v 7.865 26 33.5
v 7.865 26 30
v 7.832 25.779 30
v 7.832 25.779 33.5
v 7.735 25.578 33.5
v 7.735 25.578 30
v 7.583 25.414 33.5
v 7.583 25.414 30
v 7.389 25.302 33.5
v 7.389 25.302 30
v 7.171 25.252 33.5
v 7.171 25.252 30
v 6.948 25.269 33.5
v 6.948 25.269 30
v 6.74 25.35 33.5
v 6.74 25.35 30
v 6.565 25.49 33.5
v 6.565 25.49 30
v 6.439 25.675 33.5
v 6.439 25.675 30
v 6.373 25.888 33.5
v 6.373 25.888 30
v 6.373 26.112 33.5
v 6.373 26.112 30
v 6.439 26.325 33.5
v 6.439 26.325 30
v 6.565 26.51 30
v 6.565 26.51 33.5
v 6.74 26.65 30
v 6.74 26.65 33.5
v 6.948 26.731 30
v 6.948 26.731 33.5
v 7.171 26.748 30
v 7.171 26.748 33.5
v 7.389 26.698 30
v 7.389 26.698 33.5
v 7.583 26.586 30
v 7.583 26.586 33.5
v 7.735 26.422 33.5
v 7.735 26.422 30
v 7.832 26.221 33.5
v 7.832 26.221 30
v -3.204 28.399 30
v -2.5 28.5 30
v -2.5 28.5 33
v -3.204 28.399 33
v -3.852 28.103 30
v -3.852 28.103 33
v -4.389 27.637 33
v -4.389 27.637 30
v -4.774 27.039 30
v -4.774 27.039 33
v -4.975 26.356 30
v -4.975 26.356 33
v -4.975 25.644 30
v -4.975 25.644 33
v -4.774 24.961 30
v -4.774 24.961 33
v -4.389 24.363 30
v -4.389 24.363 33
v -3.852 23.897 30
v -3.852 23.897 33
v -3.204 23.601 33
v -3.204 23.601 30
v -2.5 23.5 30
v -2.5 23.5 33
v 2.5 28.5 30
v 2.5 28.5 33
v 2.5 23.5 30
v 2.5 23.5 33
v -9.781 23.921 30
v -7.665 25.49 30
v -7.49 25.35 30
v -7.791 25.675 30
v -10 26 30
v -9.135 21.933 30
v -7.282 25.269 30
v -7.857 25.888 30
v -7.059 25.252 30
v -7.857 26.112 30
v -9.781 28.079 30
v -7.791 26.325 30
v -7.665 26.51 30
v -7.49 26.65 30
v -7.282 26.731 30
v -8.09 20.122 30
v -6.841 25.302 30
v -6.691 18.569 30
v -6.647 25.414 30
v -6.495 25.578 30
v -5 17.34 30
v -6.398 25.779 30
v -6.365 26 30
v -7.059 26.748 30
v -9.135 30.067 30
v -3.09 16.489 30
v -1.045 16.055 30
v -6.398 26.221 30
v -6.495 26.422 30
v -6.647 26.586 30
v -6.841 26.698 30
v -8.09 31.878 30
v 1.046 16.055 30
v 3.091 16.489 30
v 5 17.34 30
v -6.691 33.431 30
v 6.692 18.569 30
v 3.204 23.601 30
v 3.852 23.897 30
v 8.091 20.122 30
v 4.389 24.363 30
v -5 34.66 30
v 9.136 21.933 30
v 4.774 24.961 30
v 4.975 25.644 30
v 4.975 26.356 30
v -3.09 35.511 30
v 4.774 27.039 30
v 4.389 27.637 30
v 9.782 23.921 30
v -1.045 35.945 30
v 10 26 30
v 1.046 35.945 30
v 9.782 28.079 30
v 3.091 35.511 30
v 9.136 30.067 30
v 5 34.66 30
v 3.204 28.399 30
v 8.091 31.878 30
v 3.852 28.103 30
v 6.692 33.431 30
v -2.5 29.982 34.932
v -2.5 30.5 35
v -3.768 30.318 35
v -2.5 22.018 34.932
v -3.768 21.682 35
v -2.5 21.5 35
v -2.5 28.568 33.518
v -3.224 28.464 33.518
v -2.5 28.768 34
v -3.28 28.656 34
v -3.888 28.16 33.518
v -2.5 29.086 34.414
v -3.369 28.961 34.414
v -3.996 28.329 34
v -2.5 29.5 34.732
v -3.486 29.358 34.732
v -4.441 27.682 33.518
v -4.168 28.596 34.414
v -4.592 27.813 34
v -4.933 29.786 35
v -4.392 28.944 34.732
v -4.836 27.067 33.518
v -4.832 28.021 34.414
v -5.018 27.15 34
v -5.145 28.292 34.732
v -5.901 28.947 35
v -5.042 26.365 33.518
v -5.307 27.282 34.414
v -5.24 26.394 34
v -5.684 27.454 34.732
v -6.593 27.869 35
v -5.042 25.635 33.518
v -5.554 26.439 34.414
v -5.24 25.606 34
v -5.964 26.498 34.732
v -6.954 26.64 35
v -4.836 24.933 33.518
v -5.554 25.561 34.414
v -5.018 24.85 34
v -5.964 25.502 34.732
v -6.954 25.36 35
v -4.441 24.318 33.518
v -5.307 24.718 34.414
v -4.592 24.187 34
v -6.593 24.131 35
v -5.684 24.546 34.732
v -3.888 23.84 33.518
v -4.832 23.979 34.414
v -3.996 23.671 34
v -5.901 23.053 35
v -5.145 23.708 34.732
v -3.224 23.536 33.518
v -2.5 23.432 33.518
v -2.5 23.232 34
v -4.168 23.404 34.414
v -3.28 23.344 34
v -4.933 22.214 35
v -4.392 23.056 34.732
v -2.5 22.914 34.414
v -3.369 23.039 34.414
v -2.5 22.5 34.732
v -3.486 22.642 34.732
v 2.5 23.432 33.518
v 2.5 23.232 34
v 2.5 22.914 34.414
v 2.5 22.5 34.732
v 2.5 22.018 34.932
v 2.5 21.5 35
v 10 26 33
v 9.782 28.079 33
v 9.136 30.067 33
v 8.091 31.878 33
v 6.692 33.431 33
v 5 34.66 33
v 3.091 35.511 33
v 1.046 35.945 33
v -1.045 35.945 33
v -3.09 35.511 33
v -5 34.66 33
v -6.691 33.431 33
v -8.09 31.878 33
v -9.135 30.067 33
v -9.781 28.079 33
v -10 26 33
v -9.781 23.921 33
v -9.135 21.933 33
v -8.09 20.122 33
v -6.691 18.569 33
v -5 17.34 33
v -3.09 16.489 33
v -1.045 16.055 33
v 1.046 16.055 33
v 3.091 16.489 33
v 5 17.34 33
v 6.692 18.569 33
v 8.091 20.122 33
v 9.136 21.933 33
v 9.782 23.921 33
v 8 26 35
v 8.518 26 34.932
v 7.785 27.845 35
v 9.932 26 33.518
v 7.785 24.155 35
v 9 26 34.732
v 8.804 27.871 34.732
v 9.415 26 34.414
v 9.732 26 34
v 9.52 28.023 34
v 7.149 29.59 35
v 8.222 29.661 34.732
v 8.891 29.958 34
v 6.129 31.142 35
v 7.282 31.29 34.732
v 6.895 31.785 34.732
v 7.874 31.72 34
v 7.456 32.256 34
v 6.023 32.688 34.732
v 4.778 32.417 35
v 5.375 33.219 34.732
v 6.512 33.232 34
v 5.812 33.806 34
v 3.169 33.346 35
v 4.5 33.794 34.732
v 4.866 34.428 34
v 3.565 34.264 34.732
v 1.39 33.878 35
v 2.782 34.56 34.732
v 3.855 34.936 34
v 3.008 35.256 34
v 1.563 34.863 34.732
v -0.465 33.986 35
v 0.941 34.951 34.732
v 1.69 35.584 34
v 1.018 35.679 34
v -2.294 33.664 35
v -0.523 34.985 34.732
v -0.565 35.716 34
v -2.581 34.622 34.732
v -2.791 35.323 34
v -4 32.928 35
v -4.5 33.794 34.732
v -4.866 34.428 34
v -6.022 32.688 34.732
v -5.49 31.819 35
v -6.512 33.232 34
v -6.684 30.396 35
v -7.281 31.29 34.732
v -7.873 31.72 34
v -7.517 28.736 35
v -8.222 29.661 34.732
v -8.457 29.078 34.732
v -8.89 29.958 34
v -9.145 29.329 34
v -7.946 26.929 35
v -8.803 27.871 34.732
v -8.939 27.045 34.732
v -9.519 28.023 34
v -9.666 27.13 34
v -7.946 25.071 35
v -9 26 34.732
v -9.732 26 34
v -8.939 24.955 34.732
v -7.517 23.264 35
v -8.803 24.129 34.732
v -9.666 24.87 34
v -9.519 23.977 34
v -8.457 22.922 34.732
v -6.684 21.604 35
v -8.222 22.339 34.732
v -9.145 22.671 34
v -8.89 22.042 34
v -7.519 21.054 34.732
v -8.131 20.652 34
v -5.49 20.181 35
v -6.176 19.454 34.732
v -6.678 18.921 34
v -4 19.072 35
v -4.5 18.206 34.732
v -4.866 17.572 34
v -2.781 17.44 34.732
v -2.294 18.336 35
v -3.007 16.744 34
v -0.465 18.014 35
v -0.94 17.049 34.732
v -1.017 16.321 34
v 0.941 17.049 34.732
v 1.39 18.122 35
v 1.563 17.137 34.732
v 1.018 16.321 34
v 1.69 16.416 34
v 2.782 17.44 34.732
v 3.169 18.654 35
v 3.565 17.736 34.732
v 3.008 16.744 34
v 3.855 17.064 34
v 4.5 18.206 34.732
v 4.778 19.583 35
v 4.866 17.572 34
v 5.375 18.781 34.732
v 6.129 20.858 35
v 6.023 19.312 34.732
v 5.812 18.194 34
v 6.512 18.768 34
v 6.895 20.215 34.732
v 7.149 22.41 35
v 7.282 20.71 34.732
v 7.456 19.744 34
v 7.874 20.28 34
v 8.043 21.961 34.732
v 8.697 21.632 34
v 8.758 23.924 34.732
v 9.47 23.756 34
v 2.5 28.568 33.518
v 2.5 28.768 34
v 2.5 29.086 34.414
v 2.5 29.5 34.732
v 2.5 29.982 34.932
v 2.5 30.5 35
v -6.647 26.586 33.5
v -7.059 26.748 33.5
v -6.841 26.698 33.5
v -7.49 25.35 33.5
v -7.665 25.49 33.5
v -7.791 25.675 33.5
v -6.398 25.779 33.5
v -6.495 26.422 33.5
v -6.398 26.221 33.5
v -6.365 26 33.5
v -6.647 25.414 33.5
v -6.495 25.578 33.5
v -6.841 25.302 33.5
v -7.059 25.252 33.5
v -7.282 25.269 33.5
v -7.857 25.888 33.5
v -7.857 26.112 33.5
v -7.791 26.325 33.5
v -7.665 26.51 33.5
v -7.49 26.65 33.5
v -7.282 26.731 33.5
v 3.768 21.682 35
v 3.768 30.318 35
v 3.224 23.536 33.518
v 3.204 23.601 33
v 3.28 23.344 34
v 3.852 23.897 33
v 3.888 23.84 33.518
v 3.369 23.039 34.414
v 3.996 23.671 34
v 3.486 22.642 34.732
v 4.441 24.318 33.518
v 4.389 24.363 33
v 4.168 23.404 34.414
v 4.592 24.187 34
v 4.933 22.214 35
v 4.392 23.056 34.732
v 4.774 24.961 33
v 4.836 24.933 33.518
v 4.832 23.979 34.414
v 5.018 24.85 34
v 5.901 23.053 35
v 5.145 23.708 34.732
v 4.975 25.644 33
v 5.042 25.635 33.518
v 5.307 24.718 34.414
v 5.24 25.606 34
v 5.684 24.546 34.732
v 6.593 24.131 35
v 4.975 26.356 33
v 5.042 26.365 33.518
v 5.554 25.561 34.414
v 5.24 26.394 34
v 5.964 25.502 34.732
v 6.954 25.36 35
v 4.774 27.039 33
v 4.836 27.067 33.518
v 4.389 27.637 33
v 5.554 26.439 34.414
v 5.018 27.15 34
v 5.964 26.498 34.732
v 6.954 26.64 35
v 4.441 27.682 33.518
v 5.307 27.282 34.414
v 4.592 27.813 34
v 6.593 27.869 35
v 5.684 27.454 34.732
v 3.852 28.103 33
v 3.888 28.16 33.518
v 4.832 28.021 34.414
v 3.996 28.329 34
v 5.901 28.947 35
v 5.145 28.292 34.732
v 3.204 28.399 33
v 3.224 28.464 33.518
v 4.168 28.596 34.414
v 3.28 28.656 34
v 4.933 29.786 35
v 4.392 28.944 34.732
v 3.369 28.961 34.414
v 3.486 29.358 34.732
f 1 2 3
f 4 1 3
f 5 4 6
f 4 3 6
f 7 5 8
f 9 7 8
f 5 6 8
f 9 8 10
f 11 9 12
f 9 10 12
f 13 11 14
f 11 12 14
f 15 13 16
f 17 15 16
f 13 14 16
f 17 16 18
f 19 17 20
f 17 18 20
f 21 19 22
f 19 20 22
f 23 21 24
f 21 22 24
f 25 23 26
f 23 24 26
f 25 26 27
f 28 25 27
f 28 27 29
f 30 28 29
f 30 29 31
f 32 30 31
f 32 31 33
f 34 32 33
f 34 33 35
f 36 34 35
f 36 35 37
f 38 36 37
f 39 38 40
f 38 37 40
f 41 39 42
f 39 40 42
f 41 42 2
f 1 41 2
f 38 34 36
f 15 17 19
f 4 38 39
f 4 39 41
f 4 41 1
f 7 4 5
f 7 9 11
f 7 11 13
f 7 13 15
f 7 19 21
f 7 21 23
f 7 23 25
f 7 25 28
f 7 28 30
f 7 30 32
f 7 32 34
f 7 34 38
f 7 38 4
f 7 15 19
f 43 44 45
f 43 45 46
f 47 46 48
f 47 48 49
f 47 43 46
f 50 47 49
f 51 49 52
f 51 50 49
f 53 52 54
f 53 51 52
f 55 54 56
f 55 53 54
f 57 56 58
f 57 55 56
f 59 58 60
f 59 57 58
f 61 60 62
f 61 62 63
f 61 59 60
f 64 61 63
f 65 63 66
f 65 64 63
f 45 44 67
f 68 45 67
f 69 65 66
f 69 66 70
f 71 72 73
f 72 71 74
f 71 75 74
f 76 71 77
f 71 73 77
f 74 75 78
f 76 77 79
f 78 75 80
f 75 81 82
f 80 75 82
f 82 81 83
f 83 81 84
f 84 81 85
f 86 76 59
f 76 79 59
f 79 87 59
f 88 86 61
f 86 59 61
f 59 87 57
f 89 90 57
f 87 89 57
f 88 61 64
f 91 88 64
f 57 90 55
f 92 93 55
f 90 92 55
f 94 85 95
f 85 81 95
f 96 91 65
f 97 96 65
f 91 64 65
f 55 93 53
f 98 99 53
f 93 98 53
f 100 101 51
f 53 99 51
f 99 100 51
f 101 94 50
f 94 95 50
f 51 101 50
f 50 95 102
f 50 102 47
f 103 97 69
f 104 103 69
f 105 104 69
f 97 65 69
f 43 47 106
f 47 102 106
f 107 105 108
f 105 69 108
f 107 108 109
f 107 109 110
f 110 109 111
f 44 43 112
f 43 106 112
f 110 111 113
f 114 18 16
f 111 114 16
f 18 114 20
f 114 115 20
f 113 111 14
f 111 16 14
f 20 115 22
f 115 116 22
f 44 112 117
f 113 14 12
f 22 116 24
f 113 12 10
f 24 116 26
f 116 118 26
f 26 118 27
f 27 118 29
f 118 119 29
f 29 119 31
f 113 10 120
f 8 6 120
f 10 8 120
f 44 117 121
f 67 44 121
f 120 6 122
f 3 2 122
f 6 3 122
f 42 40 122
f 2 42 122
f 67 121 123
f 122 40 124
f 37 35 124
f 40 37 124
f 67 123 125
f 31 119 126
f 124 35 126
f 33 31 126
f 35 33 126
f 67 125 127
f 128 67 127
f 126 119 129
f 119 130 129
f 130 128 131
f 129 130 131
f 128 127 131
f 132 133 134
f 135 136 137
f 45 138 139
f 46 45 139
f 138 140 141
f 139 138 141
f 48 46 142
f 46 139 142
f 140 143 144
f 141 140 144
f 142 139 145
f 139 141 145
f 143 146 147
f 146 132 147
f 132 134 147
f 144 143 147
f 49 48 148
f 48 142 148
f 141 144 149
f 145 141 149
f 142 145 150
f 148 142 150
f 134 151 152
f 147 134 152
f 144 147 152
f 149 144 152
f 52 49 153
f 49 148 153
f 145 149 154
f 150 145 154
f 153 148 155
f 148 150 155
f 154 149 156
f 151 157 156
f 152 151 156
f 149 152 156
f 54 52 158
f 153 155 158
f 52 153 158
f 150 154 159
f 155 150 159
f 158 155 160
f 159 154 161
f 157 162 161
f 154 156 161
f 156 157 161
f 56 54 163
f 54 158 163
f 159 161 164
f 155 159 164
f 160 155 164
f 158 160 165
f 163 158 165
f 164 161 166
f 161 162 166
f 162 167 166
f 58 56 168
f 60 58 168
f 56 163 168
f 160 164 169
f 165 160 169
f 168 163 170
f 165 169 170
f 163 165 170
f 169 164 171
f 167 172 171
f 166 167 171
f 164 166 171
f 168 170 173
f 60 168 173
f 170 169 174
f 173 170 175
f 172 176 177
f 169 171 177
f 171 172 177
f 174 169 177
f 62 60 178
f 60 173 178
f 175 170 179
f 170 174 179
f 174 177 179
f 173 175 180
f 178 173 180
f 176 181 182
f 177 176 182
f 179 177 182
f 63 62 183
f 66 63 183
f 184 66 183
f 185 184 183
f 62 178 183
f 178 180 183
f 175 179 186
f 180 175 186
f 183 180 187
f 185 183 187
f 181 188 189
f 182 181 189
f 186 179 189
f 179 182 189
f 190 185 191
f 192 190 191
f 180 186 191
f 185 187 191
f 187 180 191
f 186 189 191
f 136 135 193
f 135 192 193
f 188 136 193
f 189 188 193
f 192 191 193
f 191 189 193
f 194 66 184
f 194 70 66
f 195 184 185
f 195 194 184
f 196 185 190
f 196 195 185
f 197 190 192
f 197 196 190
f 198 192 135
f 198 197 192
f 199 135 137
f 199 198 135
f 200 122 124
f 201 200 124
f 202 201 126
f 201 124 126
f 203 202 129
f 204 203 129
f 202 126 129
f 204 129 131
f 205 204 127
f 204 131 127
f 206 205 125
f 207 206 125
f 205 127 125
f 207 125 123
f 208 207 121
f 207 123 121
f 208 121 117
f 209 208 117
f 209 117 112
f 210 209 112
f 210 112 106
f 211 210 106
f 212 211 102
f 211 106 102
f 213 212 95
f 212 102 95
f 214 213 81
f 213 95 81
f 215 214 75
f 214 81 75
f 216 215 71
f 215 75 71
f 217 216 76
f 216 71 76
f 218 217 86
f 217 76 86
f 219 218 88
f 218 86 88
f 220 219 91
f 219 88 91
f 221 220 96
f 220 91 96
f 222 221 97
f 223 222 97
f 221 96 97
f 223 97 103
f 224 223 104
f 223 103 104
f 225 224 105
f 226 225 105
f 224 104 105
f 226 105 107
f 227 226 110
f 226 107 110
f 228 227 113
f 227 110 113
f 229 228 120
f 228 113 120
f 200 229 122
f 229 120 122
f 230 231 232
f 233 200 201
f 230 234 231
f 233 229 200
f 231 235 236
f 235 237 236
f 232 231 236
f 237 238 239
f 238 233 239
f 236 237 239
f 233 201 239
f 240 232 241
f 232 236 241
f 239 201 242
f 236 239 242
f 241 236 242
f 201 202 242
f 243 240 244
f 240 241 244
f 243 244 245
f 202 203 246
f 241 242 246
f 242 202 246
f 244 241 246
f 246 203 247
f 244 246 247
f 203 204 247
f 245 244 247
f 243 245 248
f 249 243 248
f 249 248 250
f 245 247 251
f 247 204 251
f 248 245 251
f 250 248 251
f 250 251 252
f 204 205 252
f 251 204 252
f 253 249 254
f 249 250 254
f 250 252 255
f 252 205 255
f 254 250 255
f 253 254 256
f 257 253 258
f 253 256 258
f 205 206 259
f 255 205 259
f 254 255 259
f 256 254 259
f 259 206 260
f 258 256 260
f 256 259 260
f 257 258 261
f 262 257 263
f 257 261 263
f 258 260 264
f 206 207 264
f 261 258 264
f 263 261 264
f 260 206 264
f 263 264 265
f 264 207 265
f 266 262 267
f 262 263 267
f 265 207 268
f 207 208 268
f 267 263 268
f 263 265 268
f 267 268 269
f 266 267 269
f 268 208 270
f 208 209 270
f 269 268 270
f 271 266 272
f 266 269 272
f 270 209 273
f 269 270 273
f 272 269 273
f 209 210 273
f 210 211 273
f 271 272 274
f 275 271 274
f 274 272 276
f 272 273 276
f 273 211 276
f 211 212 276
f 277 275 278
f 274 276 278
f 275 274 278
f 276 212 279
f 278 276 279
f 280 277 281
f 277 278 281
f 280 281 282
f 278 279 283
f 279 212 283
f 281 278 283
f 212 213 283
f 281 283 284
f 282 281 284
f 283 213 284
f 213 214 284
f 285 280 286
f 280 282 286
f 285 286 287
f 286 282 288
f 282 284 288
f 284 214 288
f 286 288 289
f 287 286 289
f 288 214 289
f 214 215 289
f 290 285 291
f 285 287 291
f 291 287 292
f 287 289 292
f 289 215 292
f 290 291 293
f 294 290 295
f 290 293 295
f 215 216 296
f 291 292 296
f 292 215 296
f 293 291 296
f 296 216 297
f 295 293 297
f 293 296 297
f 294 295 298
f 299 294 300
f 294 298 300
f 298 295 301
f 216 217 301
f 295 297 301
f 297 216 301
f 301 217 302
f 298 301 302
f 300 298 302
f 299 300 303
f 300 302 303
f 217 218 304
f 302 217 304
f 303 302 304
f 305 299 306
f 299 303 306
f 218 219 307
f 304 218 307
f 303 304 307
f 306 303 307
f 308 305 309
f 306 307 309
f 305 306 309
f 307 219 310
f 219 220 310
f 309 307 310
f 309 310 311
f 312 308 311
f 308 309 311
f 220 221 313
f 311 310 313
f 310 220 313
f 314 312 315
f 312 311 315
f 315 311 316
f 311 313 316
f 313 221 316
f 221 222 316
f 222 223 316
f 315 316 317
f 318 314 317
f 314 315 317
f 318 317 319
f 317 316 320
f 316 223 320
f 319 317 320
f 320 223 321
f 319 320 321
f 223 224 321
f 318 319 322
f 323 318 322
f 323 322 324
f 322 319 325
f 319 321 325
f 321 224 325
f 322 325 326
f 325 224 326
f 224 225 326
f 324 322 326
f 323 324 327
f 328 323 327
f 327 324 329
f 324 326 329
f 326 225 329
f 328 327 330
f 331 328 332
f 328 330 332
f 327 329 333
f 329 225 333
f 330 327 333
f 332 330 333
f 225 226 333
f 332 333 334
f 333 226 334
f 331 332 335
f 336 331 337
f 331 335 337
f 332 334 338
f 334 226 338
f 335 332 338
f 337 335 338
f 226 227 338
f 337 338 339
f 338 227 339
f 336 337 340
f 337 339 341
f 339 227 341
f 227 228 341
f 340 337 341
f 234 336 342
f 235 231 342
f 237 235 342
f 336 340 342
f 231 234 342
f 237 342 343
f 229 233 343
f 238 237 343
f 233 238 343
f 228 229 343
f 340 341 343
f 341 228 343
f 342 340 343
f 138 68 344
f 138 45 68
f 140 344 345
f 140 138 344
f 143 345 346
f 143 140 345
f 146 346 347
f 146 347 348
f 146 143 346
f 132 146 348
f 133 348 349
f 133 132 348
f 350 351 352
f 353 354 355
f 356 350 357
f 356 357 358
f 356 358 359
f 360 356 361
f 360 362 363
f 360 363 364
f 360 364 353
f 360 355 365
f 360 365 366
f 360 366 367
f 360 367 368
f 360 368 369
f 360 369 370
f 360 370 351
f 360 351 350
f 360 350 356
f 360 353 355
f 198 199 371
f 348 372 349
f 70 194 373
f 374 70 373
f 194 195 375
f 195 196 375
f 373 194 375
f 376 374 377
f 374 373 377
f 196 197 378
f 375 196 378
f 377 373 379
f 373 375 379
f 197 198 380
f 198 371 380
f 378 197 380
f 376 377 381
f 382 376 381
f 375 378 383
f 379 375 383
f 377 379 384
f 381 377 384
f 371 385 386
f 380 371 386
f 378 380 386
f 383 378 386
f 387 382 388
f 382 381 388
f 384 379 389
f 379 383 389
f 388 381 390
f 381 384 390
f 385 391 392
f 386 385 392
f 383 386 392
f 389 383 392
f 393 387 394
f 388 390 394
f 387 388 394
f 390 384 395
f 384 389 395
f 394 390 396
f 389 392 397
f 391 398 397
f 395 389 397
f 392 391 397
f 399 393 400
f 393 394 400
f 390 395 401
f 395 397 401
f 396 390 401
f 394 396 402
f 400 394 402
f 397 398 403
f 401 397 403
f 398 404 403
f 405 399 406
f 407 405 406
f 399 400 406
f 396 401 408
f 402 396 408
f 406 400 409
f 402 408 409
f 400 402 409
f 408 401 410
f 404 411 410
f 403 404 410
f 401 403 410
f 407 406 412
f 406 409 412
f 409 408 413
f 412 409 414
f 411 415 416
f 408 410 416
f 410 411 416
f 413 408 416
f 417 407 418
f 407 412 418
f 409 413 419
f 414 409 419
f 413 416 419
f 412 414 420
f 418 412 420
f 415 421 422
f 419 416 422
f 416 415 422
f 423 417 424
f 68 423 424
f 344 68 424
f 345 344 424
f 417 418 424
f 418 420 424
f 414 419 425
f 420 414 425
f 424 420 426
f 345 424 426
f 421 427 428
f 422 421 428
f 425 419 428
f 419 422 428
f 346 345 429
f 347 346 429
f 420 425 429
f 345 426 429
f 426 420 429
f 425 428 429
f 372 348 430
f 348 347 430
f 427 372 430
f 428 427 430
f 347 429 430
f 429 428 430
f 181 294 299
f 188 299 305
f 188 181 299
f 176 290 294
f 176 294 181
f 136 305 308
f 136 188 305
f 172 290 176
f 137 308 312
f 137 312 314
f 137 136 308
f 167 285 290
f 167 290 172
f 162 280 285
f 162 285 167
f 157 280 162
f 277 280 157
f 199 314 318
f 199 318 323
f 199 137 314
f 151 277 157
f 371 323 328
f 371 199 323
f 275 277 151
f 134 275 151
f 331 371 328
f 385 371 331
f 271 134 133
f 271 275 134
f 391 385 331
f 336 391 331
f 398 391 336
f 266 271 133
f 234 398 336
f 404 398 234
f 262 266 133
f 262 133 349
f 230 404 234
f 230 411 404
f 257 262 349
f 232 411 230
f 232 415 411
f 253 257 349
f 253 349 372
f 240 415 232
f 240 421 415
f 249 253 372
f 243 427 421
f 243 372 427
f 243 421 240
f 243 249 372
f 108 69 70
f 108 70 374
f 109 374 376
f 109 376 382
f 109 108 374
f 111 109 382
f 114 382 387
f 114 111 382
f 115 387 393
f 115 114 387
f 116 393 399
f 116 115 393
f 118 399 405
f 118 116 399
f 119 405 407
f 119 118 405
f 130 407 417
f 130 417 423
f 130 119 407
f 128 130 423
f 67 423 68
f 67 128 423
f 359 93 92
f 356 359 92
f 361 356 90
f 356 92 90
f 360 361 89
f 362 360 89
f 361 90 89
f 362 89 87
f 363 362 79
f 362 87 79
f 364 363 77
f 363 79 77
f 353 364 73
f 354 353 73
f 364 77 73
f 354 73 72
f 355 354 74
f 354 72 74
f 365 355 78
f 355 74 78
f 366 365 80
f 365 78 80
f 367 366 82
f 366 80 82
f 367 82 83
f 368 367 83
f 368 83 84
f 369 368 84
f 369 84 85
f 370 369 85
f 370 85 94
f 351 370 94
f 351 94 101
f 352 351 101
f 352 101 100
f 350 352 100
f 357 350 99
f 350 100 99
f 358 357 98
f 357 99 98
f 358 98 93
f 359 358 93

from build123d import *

# Parameters (mm, degrees)
SKETCH011_R     = 10
PAD005_DEPTH    = 5
FILLET_R        = 2
FILLET001_R     = 2
SKETCH012_R     = 0.75
POCKET006_DEPTH = 3.5


with BuildPart() as part:
    # Sketch011 (on Face1 of CopyPocket005) → Pad005 (new body)
    with BuildSketch(Plane.XY.offset(30)):
        with Locations((0.000374, 26)):
            Circle(SKETCH011_R)
        with BuildLine():
            ThreePointArc((-2.5, 28.5), (-5, 26), (-2.5, 23.5))
            Line((-2.5, 23.5), (2.5, 23.5))
            ThreePointArc((2.5, 23.5), (5, 26), (2.5, 28.5))
            Line((-2.5, 28.5), (2.5, 28.5))
        make_face(mode=Mode.SUBTRACT)
    extrude(amount=PAD005_DEPTH)

    # Fillet
    fillet_edges = [part.edges().sort_by_distance(p)[0] for p in [
        (-5, 26, 35),
    ]]
    fillet(fillet_edges, radius=FILLET_R)

    # Fillet001
    fillet001_edges = [part.edges().sort_by_distance(p)[0] for p in [
        (-9.999626, 26, 35),
    ]]
    fillet(fillet001_edges, radius=FILLET001_R)

    # Sketch012 (on Face12 of Fillet001) → Pocket006 (cut)
    with BuildSketch(Plane(origin=(0, 0, 30), x_dir=(1, 0, 0), z_dir=(0, 0, -1))):
        with Locations((-7.115, -26)):
            Circle(SKETCH012_R)
        with Locations((7.115, -26)):
            Circle(SKETCH012_R)
    extrude(amount=-POCKET006_DEPTH, mode=Mode.SUBTRACT)


solid = part.part
